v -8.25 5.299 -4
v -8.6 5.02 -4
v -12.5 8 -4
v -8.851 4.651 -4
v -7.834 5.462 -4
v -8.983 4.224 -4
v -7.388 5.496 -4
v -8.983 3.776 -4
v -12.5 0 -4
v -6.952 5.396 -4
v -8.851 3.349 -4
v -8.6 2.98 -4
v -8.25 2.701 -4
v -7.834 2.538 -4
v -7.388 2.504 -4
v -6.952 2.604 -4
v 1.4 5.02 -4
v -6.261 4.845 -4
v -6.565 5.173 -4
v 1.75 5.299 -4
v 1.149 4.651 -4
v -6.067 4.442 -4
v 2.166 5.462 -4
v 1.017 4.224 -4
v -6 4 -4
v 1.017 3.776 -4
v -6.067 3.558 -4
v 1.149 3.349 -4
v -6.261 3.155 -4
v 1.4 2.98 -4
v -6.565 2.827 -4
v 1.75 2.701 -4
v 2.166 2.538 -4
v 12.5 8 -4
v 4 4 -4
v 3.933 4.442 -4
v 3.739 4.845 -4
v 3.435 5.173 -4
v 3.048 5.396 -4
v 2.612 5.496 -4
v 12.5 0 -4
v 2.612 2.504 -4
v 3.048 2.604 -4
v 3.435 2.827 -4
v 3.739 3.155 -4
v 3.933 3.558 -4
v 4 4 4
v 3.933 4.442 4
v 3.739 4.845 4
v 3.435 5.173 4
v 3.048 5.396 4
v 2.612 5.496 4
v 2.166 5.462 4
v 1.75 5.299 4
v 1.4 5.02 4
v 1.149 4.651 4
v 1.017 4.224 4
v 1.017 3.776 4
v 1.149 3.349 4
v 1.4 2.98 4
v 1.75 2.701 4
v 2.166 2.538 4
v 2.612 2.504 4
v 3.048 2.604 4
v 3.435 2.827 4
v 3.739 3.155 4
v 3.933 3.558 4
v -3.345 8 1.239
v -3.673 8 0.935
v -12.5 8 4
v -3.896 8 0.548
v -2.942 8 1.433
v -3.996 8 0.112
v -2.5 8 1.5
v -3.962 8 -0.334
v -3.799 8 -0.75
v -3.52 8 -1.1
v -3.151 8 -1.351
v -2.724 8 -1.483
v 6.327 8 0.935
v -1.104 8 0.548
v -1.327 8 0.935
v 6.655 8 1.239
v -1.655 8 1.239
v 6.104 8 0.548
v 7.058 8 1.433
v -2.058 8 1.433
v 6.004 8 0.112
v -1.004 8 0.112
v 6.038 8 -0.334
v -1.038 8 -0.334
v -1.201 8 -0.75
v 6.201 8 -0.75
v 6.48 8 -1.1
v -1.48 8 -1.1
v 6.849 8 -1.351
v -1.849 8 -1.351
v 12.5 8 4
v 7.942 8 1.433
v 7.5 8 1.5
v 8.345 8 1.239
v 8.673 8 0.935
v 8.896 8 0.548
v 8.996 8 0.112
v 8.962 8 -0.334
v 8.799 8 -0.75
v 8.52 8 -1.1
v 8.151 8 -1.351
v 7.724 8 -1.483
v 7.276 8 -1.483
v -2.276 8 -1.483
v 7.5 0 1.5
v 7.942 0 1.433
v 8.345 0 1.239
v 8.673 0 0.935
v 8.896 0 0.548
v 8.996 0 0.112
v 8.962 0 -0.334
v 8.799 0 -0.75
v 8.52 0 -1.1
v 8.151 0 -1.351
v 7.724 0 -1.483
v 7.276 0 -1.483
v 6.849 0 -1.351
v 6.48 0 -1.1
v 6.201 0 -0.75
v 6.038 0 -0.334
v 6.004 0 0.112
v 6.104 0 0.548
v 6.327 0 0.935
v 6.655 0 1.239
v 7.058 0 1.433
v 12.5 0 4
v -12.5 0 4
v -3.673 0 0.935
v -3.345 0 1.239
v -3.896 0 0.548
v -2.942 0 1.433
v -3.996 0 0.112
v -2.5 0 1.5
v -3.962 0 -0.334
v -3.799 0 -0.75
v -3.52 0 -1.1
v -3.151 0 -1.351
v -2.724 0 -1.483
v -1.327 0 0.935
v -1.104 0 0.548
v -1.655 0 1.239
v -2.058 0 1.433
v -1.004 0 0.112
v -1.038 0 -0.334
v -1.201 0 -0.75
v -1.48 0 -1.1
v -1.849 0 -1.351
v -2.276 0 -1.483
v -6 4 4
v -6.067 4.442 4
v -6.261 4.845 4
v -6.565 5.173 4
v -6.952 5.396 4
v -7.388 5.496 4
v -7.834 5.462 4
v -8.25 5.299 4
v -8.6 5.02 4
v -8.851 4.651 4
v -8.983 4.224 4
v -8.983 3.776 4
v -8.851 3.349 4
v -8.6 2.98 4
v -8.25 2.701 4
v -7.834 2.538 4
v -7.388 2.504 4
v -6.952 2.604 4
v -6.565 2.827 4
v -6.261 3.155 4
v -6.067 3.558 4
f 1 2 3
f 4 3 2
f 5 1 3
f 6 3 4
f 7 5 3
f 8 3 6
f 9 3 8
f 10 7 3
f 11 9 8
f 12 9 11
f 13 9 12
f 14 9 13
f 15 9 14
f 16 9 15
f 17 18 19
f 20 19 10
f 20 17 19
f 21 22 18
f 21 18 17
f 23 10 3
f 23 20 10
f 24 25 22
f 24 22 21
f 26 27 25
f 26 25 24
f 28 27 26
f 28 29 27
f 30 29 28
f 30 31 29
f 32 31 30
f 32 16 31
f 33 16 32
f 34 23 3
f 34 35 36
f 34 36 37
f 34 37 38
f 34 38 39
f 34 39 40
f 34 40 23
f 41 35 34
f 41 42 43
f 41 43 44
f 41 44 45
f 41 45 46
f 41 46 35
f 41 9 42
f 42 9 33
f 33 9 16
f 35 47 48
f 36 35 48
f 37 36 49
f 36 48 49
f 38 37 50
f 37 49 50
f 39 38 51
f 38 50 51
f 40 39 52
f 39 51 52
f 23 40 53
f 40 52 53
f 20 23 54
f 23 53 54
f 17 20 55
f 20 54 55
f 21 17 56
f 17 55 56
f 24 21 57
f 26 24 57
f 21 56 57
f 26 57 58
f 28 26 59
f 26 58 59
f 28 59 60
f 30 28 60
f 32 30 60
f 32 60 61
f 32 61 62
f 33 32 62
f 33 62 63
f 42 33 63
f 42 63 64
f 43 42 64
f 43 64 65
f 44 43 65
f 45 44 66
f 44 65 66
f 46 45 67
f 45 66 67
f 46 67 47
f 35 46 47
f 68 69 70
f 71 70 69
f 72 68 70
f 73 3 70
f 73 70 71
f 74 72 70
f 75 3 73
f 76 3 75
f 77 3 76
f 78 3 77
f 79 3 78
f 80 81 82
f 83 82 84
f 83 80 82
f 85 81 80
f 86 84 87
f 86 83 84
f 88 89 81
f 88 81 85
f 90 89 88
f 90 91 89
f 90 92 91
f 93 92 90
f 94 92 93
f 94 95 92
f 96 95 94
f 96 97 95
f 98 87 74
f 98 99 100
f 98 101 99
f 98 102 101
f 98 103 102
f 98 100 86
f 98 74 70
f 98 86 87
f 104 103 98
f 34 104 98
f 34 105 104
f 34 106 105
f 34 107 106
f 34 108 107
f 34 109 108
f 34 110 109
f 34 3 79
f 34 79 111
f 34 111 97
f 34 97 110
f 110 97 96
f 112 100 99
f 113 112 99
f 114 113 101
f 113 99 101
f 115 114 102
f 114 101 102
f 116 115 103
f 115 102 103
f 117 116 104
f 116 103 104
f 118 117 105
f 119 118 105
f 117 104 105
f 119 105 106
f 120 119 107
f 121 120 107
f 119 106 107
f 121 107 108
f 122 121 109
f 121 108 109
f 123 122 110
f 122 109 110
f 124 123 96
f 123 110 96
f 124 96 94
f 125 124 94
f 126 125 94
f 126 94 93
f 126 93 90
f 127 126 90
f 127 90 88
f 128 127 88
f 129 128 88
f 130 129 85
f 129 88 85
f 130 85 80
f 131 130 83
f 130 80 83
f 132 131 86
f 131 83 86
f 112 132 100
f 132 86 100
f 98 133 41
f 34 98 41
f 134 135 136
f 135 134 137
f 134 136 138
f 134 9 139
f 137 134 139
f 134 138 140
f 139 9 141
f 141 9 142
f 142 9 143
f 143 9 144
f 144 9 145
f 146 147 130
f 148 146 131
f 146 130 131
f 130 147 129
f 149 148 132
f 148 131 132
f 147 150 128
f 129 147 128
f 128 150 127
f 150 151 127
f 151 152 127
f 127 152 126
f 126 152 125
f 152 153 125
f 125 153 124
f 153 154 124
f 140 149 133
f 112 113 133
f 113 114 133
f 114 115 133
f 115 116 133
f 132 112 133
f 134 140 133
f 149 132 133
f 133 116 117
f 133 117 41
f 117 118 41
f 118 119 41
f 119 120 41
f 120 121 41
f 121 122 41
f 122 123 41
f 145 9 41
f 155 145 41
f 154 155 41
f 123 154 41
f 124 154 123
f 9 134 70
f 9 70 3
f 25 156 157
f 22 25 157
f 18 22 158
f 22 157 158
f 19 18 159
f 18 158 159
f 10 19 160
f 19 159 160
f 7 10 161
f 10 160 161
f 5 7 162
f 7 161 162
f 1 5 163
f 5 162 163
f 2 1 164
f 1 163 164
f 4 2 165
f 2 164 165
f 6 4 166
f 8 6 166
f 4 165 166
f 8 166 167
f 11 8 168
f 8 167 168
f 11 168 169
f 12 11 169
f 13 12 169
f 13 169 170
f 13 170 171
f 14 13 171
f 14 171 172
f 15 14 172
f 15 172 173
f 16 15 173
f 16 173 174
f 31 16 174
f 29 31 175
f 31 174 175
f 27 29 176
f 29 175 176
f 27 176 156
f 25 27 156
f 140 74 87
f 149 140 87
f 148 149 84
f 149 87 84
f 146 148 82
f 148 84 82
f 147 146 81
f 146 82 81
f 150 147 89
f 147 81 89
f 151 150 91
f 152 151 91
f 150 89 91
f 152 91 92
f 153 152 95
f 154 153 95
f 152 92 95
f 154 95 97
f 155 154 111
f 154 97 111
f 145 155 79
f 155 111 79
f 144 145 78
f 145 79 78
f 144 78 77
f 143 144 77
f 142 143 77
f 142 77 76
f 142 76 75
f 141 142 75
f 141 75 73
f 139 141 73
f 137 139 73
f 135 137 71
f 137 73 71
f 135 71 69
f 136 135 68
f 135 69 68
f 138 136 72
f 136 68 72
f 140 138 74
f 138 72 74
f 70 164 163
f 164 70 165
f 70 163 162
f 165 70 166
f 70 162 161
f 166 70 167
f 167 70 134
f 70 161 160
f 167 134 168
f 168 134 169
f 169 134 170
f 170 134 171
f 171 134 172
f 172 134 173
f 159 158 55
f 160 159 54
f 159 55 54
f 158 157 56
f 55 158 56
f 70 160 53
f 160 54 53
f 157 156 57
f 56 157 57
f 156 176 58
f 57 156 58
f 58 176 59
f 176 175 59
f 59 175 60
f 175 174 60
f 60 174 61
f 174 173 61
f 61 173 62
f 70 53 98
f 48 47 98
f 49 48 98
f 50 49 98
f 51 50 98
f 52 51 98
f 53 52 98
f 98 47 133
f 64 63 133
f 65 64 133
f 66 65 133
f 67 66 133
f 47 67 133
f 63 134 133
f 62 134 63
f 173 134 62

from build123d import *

# Parameters (mm, degrees)
SKETCH_1_W          = 25
SKETCH_1_H          = 8
EXTRUDE_1_DEPTH     = 8
SKETCH_2_R          = 1.5
CUT_EXTRUDE_1_DEPTH = 8
SKETCH_3_R          = 1.5
CUT_EXTRUDE_2_DEPTH = 8


with BuildPart() as part:
    # 草图1 → 凸台-拉伸1 (new body)
    with BuildSketch(Plane(origin=(0, 0, 0), x_dir=(1, 0, 0), z_dir=(0, 1, 0))):
        Rectangle(SKETCH_1_W, SKETCH_1_H)
    extrude(amount=EXTRUDE_1_DEPTH)

    # 草图2 → 切除-拉伸1 (cut)
    with BuildSketch(Plane(origin=(0, 8, 0), x_dir=(1, 0, 0), z_dir=(0, 1, 0))):
        with Locations(Location((7.5, 0, 0), (0, 0, 270))):
            Circle(SKETCH_2_R)
        with Locations(Location((-2.5, 0, 0), (0, 0, 270))):
            Circle(SKETCH_2_R)
    extrude(amount=-CUT_EXTRUDE_1_DEPTH, mode=Mode.SUBTRACT)

    # 草图3 → 切除-拉伸2 (cut)
    with BuildSketch(Plane.XY.offset(4)):
        with Locations((-7.5, 4)):
            Circle(SKETCH_3_R)
        with Locations((2.5, 4)):
            Circle(SKETCH_3_R)
    extrude(amount=-CUT_EXTRUDE_2_DEPTH, mode=Mode.SUBTRACT)


solid = part.part
